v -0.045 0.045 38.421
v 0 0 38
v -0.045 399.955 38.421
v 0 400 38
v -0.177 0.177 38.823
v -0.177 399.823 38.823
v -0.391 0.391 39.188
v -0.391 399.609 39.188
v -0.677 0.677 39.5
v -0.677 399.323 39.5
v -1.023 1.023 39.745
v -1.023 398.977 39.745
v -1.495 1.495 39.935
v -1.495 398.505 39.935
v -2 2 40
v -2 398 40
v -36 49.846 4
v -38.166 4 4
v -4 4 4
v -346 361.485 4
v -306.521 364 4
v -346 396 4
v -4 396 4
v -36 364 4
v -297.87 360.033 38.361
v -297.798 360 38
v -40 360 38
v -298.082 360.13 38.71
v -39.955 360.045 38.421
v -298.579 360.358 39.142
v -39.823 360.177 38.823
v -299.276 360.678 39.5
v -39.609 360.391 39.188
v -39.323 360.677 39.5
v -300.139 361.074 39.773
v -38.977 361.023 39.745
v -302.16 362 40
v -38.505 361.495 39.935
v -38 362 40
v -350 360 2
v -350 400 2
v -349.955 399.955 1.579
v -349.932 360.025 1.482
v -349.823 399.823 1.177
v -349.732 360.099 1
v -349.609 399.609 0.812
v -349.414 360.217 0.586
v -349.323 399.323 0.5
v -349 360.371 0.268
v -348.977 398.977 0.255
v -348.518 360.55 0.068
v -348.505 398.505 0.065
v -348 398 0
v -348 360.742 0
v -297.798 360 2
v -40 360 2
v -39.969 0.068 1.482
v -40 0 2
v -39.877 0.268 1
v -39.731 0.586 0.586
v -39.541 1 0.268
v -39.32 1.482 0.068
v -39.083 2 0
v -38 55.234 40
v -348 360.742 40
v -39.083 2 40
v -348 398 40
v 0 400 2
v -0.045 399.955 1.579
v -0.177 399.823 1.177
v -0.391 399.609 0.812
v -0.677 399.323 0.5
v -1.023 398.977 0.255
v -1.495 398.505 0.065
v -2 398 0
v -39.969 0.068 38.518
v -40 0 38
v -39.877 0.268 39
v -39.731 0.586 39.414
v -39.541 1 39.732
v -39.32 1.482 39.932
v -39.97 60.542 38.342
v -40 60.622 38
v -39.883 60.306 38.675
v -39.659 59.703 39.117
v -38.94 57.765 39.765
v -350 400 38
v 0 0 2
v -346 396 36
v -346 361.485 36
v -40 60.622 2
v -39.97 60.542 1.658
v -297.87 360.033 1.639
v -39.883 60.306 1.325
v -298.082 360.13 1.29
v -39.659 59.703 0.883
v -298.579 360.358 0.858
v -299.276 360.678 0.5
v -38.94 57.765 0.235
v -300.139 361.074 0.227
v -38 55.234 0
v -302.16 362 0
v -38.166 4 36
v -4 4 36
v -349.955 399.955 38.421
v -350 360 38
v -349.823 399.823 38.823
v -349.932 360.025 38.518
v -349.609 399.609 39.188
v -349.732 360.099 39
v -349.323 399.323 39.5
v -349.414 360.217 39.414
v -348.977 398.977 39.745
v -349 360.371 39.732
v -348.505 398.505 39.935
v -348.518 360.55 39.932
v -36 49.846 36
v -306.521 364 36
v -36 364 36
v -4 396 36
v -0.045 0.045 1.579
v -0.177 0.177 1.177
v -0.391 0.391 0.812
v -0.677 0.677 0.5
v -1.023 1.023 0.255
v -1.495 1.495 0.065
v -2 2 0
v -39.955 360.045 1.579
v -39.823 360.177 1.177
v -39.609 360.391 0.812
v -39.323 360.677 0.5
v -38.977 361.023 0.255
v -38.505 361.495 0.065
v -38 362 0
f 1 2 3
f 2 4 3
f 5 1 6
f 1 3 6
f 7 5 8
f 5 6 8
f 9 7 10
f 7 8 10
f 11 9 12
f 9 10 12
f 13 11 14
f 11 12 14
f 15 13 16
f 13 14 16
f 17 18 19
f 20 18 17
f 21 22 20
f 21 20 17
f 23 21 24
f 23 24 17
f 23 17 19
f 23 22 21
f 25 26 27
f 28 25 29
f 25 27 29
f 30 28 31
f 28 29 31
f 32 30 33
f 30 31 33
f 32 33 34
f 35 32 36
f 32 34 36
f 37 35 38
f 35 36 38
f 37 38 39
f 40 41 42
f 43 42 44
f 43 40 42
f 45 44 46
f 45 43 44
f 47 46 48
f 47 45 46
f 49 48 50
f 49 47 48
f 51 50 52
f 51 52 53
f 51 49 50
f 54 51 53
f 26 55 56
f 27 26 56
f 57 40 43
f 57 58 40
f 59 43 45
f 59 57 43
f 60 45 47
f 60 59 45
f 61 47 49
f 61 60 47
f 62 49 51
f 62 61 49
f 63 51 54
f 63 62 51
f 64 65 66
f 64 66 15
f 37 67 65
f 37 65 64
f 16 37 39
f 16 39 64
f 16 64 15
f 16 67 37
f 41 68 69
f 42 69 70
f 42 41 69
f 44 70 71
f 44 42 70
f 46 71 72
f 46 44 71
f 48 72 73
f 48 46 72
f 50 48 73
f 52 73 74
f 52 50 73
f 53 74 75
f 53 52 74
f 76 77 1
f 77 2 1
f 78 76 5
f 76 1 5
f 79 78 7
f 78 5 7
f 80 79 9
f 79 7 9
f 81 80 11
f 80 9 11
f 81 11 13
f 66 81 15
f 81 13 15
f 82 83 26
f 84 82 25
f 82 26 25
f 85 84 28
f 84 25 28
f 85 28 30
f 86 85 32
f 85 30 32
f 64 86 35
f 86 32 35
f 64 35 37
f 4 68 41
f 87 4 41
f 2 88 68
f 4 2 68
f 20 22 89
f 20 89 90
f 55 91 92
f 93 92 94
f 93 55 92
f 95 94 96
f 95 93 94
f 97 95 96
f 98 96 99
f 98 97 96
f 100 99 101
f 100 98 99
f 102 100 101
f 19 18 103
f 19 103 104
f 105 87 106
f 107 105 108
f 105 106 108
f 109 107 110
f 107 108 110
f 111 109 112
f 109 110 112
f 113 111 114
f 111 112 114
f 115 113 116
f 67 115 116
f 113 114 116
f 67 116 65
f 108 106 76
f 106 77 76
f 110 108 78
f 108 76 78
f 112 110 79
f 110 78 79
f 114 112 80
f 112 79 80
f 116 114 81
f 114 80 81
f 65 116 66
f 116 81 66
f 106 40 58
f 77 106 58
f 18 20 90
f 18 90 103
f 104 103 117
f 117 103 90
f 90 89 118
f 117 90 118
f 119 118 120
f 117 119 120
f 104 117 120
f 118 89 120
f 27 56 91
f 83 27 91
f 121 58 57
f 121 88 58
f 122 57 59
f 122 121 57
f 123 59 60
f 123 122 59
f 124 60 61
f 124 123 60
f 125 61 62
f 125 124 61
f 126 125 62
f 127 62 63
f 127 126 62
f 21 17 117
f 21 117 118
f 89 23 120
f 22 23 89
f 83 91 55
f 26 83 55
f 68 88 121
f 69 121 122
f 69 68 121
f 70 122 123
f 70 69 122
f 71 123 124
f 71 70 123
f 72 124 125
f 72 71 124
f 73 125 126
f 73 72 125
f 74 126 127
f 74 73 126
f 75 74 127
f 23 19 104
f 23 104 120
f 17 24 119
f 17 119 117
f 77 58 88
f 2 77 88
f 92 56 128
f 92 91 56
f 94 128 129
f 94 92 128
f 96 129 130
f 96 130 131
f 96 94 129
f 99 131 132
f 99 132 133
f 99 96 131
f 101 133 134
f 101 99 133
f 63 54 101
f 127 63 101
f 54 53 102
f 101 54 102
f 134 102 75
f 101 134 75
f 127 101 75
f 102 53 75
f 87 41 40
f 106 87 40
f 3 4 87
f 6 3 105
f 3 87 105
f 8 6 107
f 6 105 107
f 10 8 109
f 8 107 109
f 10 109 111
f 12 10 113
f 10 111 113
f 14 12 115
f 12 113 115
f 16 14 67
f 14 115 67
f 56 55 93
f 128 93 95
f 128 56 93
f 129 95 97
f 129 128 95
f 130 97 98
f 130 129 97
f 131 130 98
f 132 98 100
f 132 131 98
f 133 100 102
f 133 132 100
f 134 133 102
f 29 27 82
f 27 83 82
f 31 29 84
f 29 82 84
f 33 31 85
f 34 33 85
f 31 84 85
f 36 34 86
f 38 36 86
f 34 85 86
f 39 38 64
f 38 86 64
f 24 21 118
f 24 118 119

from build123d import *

# Parameters (mm, degrees)
BOSS_EXTRU_1_DEPTH = 40
CONG_1_R           = 2
COQUE1_START       = 4
COQUE1_DEPTH       = 32


# Read off the part's stored shape, not the designer's step: Coque1
with BuildPart() as part:
    # Esquisse1 → Boss.-Extru.1 (new body)
    with BuildSketch(Plane.XY):
        Polygon((0, 0), (0, 400), (-350, 400), (-350, 360), (-40, 0), align=None)
        Polygon((-297.798149171, 360), (-40, 360), (-40, 60.621504188), align=None, mode=Mode.SUBTRACT)
    extrude(amount=BOSS_EXTRU_1_DEPTH)

    # Congé1
    cong_1_edges = [part.edges().sort_by_distance(p)[0] for p in [
        (-175, 400, 40),
        (-350, 380, 40),
        (-195, 180, 40),
        (-168.899074586, 210.310752094, 0),
        (-40, 210.310752094, 0),
        (-168.899074586, 360, 0),
        (-168.899074586, 210.310752094, 40),
        (-40, 210.310752094, 40),
        (-168.899074586, 360, 40),
        (-20, 0, 40),
        (-195, 180, 0),
        (-350, 380, 0),
        (-175, 400, 0),
        (0, 200, 0),
        (-20, 0, 0),
        (0, 200, 40),
    ]]
    fillet(cong_1_edges, radius=CONG_1_R)

    # Coque1 outline → Coque1 (cut)
    with BuildSketch(Plane.XY.offset(COQUE1_START)):
        Polygon((-38.165789547, 4), (-4, 4), (-4, 396), (-346, 396), (-346, 361.484889559), align=None)
        Polygon((-36, 364), (-36, 49.846292049), (-306.521248514, 364), align=None, mode=Mode.SUBTRACT)
    extrude(amount=COQUE1_DEPTH, mode=Mode.SUBTRACT)


solid = part.part
